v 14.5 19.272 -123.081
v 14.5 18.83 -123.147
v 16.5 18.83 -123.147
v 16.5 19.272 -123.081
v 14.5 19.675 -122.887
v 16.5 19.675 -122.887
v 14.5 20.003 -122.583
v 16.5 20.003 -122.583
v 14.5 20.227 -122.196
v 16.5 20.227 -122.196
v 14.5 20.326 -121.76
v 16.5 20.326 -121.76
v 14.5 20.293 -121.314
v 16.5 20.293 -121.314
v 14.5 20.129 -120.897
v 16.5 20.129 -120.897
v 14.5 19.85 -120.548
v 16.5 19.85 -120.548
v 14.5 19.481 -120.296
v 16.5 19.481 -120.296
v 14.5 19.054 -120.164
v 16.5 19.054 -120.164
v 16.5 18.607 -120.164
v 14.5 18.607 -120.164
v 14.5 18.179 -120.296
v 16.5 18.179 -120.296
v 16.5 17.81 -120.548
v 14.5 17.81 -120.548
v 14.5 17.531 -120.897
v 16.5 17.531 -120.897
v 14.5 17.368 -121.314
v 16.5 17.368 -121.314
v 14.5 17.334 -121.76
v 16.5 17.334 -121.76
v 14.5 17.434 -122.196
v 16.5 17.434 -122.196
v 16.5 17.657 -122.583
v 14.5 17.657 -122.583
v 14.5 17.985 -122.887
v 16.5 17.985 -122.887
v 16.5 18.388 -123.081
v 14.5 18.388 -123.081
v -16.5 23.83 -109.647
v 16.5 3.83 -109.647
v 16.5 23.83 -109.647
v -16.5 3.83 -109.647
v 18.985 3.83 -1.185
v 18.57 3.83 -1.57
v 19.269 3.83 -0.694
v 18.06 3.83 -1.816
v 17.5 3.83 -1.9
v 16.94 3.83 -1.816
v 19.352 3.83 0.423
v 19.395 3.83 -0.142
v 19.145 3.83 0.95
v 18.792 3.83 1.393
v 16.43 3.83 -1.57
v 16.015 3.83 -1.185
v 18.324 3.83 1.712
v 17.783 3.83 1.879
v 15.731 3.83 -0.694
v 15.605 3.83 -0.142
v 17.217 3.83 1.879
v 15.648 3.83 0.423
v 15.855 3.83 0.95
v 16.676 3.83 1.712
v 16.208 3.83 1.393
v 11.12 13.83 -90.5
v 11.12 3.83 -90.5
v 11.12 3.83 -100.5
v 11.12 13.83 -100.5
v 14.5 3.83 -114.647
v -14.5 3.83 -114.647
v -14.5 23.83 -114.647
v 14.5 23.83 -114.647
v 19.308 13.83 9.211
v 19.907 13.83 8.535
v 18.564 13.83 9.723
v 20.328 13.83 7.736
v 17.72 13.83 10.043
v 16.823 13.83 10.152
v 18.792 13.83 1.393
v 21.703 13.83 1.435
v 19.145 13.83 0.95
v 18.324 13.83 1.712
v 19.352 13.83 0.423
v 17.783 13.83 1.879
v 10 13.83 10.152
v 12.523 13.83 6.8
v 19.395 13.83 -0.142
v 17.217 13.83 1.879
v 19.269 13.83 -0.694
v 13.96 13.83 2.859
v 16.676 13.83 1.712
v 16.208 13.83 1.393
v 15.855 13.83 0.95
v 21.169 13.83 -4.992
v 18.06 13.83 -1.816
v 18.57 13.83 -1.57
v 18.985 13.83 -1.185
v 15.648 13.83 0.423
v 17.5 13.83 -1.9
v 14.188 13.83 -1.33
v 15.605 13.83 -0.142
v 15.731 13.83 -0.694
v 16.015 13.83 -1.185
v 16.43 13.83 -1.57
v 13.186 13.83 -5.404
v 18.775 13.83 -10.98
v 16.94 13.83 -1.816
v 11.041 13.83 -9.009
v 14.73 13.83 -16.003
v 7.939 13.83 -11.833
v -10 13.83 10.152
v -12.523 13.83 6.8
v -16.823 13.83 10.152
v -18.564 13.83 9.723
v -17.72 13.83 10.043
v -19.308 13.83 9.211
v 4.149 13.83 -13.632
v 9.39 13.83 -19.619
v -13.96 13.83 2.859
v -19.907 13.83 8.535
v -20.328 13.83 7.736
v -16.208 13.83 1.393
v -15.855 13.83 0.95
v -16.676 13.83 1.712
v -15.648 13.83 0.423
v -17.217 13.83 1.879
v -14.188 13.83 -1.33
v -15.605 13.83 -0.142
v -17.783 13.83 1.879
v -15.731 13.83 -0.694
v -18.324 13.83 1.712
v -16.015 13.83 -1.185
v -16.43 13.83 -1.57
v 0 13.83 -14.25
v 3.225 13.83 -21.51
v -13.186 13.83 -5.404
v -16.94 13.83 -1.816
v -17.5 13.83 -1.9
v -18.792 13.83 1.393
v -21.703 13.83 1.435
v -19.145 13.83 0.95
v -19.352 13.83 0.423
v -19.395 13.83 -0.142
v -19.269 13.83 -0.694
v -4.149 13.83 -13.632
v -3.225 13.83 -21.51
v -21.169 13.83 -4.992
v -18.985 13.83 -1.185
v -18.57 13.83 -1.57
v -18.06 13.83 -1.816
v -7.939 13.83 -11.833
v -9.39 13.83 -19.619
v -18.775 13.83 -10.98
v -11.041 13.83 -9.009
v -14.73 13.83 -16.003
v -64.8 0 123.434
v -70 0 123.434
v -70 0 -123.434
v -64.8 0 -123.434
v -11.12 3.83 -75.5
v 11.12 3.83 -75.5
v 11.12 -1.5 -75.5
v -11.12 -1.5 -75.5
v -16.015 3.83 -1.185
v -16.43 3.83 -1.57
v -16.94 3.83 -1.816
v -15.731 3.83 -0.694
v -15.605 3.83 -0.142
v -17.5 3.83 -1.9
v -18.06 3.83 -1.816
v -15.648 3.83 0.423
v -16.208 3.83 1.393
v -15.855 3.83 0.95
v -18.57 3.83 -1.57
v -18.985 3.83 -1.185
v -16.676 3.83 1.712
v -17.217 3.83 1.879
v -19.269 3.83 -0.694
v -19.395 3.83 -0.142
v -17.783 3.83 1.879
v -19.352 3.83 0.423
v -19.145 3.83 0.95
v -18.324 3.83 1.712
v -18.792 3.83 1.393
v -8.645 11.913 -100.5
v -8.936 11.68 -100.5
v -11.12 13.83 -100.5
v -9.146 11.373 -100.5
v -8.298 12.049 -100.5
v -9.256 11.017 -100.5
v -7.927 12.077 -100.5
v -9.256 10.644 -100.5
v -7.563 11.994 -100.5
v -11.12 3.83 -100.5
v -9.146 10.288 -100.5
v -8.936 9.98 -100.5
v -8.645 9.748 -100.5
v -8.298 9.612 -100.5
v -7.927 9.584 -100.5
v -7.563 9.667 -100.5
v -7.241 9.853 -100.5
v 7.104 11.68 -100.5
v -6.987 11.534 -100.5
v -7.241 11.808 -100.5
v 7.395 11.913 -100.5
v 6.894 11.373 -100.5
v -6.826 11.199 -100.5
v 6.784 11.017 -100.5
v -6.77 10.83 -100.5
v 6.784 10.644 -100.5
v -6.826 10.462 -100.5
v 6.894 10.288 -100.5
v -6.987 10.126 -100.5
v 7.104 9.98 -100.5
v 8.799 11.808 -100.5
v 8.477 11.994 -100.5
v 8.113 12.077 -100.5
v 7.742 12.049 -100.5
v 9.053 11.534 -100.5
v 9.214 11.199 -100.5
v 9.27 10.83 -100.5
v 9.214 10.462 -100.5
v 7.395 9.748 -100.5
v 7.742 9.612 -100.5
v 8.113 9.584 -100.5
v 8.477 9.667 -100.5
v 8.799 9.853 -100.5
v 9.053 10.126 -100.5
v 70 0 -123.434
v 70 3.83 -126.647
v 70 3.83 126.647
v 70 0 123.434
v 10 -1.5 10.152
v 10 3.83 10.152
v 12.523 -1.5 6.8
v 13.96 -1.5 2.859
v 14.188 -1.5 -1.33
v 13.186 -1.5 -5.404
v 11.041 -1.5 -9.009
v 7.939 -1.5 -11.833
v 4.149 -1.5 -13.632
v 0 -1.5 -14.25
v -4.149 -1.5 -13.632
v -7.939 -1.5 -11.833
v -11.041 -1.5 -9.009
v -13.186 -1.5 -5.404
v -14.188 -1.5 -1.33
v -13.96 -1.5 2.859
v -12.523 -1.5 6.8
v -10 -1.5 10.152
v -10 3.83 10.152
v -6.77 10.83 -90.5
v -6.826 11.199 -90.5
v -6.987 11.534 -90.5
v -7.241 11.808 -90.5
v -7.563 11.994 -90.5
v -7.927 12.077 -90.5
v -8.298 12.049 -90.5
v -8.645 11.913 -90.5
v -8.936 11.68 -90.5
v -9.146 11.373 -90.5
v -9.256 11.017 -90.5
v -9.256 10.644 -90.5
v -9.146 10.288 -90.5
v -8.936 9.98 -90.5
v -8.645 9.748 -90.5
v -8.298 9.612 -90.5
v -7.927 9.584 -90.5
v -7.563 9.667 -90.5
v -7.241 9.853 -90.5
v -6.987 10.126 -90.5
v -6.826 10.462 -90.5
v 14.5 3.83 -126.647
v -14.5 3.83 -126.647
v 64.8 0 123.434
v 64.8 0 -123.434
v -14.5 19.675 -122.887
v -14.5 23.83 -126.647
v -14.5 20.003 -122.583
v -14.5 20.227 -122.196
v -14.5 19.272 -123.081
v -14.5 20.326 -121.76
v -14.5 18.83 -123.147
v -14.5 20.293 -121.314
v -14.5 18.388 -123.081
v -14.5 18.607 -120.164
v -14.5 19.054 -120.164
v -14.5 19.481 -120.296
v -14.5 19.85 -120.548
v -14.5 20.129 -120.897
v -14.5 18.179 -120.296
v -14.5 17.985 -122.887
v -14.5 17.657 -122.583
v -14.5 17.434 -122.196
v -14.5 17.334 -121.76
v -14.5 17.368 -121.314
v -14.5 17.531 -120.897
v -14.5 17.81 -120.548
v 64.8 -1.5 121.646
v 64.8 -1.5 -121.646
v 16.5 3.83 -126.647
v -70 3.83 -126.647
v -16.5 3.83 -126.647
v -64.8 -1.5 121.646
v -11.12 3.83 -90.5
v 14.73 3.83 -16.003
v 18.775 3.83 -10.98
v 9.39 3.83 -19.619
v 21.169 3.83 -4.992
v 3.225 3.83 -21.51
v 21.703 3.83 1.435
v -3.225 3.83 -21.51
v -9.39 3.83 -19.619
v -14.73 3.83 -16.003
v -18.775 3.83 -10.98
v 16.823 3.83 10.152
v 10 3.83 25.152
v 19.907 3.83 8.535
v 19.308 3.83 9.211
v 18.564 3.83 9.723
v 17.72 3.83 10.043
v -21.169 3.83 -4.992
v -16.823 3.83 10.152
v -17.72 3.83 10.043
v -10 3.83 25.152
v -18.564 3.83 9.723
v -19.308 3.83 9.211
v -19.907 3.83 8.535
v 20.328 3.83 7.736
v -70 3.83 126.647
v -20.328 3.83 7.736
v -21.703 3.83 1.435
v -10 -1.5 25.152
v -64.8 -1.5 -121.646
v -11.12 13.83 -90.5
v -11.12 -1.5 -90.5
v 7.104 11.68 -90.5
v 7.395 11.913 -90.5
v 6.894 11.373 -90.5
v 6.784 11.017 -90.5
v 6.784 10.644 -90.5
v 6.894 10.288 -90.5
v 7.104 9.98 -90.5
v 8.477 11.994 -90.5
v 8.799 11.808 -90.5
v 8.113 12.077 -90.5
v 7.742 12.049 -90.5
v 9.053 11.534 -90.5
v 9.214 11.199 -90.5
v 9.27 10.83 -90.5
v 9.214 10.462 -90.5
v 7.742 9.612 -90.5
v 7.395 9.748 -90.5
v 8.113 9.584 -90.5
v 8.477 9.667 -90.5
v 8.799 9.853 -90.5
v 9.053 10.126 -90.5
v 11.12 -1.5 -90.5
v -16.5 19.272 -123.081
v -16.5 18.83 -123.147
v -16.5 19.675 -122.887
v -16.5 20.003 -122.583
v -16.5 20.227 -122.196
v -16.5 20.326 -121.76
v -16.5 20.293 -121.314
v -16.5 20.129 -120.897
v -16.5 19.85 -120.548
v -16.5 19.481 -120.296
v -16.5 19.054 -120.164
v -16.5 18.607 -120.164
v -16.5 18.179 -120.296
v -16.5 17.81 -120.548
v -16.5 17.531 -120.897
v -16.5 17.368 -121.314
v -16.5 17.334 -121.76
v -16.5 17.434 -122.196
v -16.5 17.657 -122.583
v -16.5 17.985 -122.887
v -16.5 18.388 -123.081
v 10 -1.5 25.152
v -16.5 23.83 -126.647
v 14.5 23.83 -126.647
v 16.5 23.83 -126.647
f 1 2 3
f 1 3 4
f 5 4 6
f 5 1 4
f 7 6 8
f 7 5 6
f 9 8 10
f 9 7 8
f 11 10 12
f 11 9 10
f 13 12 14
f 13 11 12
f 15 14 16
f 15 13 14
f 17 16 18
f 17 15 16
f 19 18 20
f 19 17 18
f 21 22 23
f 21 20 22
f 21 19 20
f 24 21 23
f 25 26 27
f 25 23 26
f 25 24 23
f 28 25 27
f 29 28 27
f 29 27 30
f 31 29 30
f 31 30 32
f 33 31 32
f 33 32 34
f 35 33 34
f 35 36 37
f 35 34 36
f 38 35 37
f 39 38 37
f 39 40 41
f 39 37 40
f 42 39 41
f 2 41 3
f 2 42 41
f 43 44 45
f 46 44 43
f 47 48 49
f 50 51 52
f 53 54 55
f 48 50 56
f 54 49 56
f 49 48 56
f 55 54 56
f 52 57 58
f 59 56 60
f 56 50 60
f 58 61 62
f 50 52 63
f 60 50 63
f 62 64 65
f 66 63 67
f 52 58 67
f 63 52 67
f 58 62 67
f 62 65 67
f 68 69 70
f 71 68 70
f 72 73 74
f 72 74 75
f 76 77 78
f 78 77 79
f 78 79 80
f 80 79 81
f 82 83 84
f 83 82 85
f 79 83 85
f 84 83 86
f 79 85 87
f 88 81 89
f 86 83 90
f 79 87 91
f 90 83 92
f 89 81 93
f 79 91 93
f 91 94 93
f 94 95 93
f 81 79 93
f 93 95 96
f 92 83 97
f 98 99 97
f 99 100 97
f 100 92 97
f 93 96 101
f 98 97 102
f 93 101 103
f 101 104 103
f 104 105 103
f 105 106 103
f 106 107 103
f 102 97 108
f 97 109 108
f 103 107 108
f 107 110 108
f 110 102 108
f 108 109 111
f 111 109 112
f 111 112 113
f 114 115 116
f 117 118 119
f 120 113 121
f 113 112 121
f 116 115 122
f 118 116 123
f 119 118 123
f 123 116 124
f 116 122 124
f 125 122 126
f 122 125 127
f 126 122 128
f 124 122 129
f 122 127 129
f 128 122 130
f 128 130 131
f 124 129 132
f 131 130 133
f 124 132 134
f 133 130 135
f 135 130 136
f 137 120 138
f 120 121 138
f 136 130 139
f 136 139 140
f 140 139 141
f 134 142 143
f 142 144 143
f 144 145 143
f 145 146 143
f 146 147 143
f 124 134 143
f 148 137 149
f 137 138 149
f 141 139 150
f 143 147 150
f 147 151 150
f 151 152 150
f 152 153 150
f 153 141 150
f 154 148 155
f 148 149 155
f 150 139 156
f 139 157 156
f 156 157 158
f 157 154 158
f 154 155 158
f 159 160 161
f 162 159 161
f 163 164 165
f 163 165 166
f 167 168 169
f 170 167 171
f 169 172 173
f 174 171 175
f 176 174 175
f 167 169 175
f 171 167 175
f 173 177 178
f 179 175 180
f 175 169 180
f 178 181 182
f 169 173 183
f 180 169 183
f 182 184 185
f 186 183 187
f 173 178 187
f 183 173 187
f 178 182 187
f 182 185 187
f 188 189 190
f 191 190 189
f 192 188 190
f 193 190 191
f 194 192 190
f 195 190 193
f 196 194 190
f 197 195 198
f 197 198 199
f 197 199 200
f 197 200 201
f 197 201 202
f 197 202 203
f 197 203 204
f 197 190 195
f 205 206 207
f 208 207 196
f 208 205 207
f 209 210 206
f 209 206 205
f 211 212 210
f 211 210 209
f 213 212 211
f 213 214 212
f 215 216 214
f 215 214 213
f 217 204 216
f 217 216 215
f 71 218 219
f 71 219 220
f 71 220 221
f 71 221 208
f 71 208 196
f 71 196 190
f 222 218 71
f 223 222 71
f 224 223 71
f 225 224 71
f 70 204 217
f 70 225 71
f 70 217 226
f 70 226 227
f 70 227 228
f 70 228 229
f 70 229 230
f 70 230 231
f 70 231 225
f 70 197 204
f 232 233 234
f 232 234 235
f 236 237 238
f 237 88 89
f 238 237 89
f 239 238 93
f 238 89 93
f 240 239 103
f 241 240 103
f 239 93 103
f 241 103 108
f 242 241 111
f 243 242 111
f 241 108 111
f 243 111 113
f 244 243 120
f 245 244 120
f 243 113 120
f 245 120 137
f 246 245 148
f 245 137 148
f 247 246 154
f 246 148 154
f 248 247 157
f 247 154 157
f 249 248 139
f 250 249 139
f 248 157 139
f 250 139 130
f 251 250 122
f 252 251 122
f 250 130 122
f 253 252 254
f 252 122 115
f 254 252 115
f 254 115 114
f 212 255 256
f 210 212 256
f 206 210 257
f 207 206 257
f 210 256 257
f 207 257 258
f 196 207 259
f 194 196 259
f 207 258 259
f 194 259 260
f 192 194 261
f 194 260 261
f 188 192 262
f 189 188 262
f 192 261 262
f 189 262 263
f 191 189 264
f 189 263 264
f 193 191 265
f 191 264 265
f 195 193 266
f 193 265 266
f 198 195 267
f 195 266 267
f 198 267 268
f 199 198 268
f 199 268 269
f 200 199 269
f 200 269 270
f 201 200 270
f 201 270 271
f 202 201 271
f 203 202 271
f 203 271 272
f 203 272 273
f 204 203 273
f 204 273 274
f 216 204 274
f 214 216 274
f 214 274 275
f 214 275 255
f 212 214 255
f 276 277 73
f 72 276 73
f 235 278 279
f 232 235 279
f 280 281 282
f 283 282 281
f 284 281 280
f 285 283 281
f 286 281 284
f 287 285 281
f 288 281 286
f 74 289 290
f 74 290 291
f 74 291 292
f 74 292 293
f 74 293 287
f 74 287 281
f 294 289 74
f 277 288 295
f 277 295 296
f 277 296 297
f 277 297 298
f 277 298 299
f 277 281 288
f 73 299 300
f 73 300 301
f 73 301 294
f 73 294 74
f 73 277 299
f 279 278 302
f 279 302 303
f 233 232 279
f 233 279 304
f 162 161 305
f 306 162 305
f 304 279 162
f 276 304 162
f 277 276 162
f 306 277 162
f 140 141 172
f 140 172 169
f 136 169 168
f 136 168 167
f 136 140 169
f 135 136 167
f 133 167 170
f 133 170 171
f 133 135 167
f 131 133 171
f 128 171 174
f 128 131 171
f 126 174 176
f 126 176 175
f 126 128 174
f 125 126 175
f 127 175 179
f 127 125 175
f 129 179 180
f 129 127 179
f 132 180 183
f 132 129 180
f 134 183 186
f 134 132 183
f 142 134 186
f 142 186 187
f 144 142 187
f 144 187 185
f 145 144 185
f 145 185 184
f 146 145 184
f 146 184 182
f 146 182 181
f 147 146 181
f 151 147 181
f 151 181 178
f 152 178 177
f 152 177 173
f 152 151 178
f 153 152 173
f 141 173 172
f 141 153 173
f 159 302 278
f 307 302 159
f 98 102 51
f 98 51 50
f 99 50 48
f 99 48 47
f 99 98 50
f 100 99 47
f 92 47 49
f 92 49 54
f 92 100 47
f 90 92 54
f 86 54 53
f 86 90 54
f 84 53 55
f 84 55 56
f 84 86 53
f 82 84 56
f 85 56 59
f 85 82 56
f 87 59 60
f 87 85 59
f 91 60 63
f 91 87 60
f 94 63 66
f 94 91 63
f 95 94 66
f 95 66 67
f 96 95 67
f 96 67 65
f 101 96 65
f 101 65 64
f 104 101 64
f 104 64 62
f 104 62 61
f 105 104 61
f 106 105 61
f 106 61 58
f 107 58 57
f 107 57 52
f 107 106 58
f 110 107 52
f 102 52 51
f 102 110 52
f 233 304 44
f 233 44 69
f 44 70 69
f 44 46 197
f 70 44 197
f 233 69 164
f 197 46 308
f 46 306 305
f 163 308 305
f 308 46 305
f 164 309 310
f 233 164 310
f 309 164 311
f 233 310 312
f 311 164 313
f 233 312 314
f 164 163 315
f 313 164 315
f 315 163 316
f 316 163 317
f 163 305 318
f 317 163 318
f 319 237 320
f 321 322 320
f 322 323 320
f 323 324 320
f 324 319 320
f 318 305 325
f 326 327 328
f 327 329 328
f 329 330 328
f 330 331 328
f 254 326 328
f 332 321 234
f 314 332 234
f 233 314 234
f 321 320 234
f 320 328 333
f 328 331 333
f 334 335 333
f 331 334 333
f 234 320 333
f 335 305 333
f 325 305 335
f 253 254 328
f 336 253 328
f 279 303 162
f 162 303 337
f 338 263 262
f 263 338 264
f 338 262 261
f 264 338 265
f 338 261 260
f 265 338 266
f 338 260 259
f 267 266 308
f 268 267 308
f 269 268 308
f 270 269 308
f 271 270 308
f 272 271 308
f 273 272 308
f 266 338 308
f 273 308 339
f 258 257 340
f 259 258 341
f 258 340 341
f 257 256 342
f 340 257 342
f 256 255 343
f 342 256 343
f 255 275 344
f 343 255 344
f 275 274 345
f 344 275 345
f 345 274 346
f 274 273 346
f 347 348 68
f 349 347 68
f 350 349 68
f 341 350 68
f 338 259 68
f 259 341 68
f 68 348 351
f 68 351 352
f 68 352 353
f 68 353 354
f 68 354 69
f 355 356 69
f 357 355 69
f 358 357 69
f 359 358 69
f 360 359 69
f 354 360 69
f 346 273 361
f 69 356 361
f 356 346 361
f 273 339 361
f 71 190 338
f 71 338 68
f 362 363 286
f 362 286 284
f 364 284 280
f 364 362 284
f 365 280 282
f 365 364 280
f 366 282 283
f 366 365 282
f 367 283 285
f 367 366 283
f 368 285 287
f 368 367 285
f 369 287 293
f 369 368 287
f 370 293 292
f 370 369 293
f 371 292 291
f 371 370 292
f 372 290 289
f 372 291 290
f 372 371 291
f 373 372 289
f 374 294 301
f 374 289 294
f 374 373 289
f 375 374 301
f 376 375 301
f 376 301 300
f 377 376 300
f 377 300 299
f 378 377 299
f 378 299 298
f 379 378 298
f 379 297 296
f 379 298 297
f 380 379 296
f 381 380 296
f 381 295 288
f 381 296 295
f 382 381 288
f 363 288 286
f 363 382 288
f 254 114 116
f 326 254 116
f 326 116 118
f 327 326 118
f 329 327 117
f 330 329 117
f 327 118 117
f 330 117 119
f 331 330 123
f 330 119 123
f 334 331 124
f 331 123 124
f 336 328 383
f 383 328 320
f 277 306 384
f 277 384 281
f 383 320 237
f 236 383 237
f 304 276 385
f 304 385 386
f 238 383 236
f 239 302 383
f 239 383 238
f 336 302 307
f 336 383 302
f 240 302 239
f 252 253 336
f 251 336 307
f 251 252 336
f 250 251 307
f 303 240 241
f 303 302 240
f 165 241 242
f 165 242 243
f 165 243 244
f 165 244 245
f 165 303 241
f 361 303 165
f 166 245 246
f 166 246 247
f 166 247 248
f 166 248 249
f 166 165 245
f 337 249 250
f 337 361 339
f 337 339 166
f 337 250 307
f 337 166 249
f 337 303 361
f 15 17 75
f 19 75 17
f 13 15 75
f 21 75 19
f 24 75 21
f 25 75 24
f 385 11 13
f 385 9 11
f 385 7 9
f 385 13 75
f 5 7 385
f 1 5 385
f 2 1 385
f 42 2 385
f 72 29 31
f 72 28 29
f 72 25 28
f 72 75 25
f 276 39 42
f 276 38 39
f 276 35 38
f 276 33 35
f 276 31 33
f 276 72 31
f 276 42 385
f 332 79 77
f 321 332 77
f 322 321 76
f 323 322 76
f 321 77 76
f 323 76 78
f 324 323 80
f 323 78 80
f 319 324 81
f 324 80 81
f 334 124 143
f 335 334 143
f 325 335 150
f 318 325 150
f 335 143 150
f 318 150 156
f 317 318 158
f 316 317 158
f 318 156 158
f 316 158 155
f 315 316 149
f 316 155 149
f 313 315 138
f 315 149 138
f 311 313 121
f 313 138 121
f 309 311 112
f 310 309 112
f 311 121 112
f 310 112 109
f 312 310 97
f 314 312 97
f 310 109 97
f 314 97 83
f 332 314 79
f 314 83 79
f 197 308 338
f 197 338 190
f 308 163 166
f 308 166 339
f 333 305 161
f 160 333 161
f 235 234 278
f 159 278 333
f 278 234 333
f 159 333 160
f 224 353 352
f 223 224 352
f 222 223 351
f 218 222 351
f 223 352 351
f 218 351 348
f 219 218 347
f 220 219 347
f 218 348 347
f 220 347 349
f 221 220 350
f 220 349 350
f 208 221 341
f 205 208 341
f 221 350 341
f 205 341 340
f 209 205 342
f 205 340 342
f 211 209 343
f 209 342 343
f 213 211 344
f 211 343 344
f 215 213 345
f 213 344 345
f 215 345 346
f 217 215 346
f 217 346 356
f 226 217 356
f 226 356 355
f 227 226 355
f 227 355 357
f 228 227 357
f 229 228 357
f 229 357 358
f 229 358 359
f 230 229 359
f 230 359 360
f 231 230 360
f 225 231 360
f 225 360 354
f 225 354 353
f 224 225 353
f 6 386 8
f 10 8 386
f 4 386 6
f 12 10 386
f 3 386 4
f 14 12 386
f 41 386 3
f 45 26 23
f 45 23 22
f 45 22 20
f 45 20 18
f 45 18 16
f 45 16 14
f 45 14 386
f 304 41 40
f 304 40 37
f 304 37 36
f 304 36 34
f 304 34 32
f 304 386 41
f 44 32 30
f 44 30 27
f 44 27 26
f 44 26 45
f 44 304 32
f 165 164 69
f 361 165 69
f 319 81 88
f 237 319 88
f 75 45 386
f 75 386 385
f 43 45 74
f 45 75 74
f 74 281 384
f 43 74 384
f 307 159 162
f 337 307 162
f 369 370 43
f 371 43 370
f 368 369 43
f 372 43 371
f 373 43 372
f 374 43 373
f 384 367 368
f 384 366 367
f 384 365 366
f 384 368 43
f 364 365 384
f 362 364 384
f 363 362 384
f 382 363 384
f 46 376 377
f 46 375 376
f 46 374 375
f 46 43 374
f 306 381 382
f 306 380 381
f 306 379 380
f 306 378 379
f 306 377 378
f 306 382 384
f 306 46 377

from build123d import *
from OCP.BRepFilletAPI import BRepFilletAPI_MakeChamfer

# Parameters (mm, degrees)
BOSS_EXTRU_1_DEPTH           = 70
BOSS_EXTRU_1_DEPTH_BACK      = 70
ESQUISSE12_W                 = 129.6
ESQUISSE12_H                 = 246.867117592
BOSS_EXTRU_7_DEPTH           = 1.5
CHANFREIN1_SIZE              = 1.5
CHANFREIN1_SIZE_2            = 1.787630389
ENL_V_MAT_EXTRU_1_DEPTH      = 209.036677197
ENL_V_MAT_EXTRU_1_DEPTH_BACK = 209.036677197
BOSS_EXTRU_4_START           = -10
ESQUISSE5_R                  = 1.9
BOSS_EXTRU_4_DEPTH           = 10
ENL_V_MAT_EXTRU_2_DEPTH      = 146.364588204
ENL_V_MAT_EXTRU_2_DEPTH_BACK = 146.364588204
ESQUISSE6_W                  = 22.24
ESQUISSE6_H                  = 15
ESQUISSE7_W                  = 22.24
ESQUISSE7_H                  = 10
BOSS_EXTRU_5_DEPTH           = 10
ESQUISSE8_R                  = 1.25
ENL_V_MAT_EXTRU_3_DEPTH      = 229.570143353
BOSS_EXTRU_6_DEPTH           = 20
ENL_V_MAT_EXTRU_4_DEPTH      = 147.654246266
ENL_V_MAT_EXTRU_4_DEPTH_BACK = 147.654246266
ESQUISSE11_R                 = 1.5


with BuildPart() as part:
    # Esquisse1 → Boss.-Extru.1 (new, two sides: drawn at the far end of the back side and taken through both)
    with BuildSketch(Plane(origin=(0, 0, 0), x_dir=(0, -1, 0), z_dir=(1, 0, 0)).offset(-BOSS_EXTRU_1_DEPTH_BACK)):
        Polygon((0, -123.433558796), (0, 123.433558796), (-3.830222216, 126.647496845), (-3.830222216, -126.647496845), align=None)
    extrude(amount=BOSS_EXTRU_1_DEPTH + BOSS_EXTRU_1_DEPTH_BACK)

    # Esquisse12 → Boss.-Extru.7 (add)
    with BuildSketch(Plane(origin=(0, 0, 0), x_dir=(-1, 0, 0), z_dir=(0, -1, 0))):
        Rectangle(ESQUISSE12_W, ESQUISSE12_H)
    extrude(amount=BOSS_EXTRU_7_DEPTH)

    # Chanfrein1
    chanfrein1_edges_1 = [part.edges().sort_by_distance(p)[0] for p in [
        (0, -1.5, 123.433558796),
    ]]
    chanfrein1_side_1 = [part.faces().sort_by_distance(p)[0] for p in [
        (0, -1.47, 123.433558796),
    ]]
    chanfrein1_edges_2 = [part.edges().sort_by_distance(p)[0] for p in [
        (0, -1.5, -123.433558796),
    ]]
    chanfrein1_side_2 = [part.faces().sort_by_distance(p)[0] for p in [
        (0, -1.47, -123.433558796),
    ]]
    chanfrein1 = BRepFilletAPI_MakeChamfer(part.part.solid().wrapped)
    for e in chanfrein1_edges_1:
        chanfrein1.Add(CHANFREIN1_SIZE - 0.0001, CHANFREIN1_SIZE_2 - 0.0001, e.wrapped, chanfrein1_side_1[0].wrapped)
    for e in chanfrein1_edges_2:
        chanfrein1.Add(CHANFREIN1_SIZE - 0.0001, CHANFREIN1_SIZE_2 - 0.0001, e.wrapped, chanfrein1_side_2[0].wrapped)
    add(Compound.cast(chanfrein1.Shape()), mode=Mode.REPLACE)  # a hair under: the kernel refuses the full size

    # Esquisse4 → Enlèv. mat.-Extru.1 (cut, two sides: drawn at the far end of the back side and taken through both)
    with BuildSketch(Plane(origin=(95, 0, 0), x_dir=(-1, 0, 0), z_dir=(0, -1, 0)).offset(-ENL_V_MAT_EXTRU_1_DEPTH_BACK)):
        with BuildLine():
            Line((105, -25.151970252), (85, -25.151970252))
            Line((85, -25.151970252), (85, -10.151970252))
            ThreePointArc((85, -10.151970252), (95, 14.25), (105, -10.151970252))
            Line((105, -10.151970252), (105, -25.151970252))
        make_face()
    extrude(amount=ENL_V_MAT_EXTRU_1_DEPTH + ENL_V_MAT_EXTRU_1_DEPTH_BACK, mode=Mode.SUBTRACT)

    # Esquisse5 → Boss.-Extru.4 (add)
    with BuildSketch(Plane(origin=(95, 3.830222216, 0), x_dir=(-1, 0, 0), z_dir=(0, -1, 0)).offset(BOSS_EXTRU_4_START)):
        with BuildLine():
            Line((105, -10.151970252), (111.823043033, -10.151970252))
            ThreePointArc((111.823043033, -10.151970252), (113.951535544, -9.489367154), (115.327843665, -7.735714055))
            ThreePointArc((115.327843665, -7.735714055), (95, 21.75), (74.672156335, -7.735714055))
            ThreePointArc((74.672156335, -7.735714055), (76.048464456, -9.489367154), (78.176956967, -10.151970252))
            Line((78.176956967, -10.151970252), (85, -10.151970252))
            ThreePointArc((85, -10.151970252), (95, 14.25), (105, -10.151970252))
        make_face()
        with Locations(Location((77.5, 0, 0), (0, 0, 90))):
            Circle(ESQUISSE5_R, mode=Mode.SUBTRACT)
        with Locations(Location((112.5, 0, 0), (0, 0, 90))):
            Circle(ESQUISSE5_R, mode=Mode.SUBTRACT)
    extrude(amount=BOSS_EXTRU_4_DEPTH)

    # Esquisse6 → Enlèv. mat.-Extru.2 (cut, two sides: drawn at the far end of the back side and taken through both)
    with BuildSketch(Plane(origin=(0, 0, 0), x_dir=(-1, 0, 0), z_dir=(0, -1, 0)).offset(-ENL_V_MAT_EXTRU_2_DEPTH_BACK)):
        with Locations((0, 83)):
            Rectangle(ESQUISSE6_W, ESQUISSE6_H)
    extrude(amount=ENL_V_MAT_EXTRU_2_DEPTH + ENL_V_MAT_EXTRU_2_DEPTH_BACK, mode=Mode.SUBTRACT)

    # Esquisse7 → Boss.-Extru.5 (add)
    with BuildSketch(Plane(origin=(0, 3.830222216, 0), x_dir=(1, 0, 0), z_dir=(0, 1, 0))):
        with Locations((0, 95.5)):
            Rectangle(ESQUISSE7_W, ESQUISSE7_H)
    extrude(amount=BOSS_EXTRU_5_DEPTH)

    # Esquisse8 → Enlèv. mat.-Extru.3 (cut, through all)
    with BuildSketch(Plane.XY.offset(-90.5)):
        with Locations((-8.02, 10.830222216)):
            Circle(ESQUISSE8_R)
        with Locations((8.02, 10.830222216)):
            Circle(ESQUISSE8_R)
    extrude(amount=-ENL_V_MAT_EXTRU_3_DEPTH, mode=Mode.SUBTRACT)

    # Esquisse9 → Boss.-Extru.6 (add)
    with BuildSketch(Plane(origin=(0, 3.830222216, 0), x_dir=(1, 0, 0), z_dir=(0, 1, 0))):
        Polygon((-14.5, 114.647496845), (14.5, 114.647496845), (14.5, 126.647496845), (16.5, 126.647496845), (16.5, 109.647496845), (-16.5, 109.647496845), (-16.5, 126.647496845), (-14.5, 126.647496845), align=None)
    extrude(amount=BOSS_EXTRU_6_DEPTH)

    # Esquisse11 → Enlèv. mat.-Extru.4 (cut, two sides: drawn at the far end of the back side and taken through both)
    with BuildSketch(Plane(origin=(0, 0, 0), x_dir=(0, 0, -1), z_dir=(1, 0, 0)).offset(-ENL_V_MAT_EXTRU_4_DEPTH_BACK)):
        with Locations((121.647496845, 18.830222216)):
            Circle(ESQUISSE11_R)
    extrude(amount=ENL_V_MAT_EXTRU_4_DEPTH + ENL_V_MAT_EXTRU_4_DEPTH_BACK, mode=Mode.SUBTRACT)


solid = part.part
